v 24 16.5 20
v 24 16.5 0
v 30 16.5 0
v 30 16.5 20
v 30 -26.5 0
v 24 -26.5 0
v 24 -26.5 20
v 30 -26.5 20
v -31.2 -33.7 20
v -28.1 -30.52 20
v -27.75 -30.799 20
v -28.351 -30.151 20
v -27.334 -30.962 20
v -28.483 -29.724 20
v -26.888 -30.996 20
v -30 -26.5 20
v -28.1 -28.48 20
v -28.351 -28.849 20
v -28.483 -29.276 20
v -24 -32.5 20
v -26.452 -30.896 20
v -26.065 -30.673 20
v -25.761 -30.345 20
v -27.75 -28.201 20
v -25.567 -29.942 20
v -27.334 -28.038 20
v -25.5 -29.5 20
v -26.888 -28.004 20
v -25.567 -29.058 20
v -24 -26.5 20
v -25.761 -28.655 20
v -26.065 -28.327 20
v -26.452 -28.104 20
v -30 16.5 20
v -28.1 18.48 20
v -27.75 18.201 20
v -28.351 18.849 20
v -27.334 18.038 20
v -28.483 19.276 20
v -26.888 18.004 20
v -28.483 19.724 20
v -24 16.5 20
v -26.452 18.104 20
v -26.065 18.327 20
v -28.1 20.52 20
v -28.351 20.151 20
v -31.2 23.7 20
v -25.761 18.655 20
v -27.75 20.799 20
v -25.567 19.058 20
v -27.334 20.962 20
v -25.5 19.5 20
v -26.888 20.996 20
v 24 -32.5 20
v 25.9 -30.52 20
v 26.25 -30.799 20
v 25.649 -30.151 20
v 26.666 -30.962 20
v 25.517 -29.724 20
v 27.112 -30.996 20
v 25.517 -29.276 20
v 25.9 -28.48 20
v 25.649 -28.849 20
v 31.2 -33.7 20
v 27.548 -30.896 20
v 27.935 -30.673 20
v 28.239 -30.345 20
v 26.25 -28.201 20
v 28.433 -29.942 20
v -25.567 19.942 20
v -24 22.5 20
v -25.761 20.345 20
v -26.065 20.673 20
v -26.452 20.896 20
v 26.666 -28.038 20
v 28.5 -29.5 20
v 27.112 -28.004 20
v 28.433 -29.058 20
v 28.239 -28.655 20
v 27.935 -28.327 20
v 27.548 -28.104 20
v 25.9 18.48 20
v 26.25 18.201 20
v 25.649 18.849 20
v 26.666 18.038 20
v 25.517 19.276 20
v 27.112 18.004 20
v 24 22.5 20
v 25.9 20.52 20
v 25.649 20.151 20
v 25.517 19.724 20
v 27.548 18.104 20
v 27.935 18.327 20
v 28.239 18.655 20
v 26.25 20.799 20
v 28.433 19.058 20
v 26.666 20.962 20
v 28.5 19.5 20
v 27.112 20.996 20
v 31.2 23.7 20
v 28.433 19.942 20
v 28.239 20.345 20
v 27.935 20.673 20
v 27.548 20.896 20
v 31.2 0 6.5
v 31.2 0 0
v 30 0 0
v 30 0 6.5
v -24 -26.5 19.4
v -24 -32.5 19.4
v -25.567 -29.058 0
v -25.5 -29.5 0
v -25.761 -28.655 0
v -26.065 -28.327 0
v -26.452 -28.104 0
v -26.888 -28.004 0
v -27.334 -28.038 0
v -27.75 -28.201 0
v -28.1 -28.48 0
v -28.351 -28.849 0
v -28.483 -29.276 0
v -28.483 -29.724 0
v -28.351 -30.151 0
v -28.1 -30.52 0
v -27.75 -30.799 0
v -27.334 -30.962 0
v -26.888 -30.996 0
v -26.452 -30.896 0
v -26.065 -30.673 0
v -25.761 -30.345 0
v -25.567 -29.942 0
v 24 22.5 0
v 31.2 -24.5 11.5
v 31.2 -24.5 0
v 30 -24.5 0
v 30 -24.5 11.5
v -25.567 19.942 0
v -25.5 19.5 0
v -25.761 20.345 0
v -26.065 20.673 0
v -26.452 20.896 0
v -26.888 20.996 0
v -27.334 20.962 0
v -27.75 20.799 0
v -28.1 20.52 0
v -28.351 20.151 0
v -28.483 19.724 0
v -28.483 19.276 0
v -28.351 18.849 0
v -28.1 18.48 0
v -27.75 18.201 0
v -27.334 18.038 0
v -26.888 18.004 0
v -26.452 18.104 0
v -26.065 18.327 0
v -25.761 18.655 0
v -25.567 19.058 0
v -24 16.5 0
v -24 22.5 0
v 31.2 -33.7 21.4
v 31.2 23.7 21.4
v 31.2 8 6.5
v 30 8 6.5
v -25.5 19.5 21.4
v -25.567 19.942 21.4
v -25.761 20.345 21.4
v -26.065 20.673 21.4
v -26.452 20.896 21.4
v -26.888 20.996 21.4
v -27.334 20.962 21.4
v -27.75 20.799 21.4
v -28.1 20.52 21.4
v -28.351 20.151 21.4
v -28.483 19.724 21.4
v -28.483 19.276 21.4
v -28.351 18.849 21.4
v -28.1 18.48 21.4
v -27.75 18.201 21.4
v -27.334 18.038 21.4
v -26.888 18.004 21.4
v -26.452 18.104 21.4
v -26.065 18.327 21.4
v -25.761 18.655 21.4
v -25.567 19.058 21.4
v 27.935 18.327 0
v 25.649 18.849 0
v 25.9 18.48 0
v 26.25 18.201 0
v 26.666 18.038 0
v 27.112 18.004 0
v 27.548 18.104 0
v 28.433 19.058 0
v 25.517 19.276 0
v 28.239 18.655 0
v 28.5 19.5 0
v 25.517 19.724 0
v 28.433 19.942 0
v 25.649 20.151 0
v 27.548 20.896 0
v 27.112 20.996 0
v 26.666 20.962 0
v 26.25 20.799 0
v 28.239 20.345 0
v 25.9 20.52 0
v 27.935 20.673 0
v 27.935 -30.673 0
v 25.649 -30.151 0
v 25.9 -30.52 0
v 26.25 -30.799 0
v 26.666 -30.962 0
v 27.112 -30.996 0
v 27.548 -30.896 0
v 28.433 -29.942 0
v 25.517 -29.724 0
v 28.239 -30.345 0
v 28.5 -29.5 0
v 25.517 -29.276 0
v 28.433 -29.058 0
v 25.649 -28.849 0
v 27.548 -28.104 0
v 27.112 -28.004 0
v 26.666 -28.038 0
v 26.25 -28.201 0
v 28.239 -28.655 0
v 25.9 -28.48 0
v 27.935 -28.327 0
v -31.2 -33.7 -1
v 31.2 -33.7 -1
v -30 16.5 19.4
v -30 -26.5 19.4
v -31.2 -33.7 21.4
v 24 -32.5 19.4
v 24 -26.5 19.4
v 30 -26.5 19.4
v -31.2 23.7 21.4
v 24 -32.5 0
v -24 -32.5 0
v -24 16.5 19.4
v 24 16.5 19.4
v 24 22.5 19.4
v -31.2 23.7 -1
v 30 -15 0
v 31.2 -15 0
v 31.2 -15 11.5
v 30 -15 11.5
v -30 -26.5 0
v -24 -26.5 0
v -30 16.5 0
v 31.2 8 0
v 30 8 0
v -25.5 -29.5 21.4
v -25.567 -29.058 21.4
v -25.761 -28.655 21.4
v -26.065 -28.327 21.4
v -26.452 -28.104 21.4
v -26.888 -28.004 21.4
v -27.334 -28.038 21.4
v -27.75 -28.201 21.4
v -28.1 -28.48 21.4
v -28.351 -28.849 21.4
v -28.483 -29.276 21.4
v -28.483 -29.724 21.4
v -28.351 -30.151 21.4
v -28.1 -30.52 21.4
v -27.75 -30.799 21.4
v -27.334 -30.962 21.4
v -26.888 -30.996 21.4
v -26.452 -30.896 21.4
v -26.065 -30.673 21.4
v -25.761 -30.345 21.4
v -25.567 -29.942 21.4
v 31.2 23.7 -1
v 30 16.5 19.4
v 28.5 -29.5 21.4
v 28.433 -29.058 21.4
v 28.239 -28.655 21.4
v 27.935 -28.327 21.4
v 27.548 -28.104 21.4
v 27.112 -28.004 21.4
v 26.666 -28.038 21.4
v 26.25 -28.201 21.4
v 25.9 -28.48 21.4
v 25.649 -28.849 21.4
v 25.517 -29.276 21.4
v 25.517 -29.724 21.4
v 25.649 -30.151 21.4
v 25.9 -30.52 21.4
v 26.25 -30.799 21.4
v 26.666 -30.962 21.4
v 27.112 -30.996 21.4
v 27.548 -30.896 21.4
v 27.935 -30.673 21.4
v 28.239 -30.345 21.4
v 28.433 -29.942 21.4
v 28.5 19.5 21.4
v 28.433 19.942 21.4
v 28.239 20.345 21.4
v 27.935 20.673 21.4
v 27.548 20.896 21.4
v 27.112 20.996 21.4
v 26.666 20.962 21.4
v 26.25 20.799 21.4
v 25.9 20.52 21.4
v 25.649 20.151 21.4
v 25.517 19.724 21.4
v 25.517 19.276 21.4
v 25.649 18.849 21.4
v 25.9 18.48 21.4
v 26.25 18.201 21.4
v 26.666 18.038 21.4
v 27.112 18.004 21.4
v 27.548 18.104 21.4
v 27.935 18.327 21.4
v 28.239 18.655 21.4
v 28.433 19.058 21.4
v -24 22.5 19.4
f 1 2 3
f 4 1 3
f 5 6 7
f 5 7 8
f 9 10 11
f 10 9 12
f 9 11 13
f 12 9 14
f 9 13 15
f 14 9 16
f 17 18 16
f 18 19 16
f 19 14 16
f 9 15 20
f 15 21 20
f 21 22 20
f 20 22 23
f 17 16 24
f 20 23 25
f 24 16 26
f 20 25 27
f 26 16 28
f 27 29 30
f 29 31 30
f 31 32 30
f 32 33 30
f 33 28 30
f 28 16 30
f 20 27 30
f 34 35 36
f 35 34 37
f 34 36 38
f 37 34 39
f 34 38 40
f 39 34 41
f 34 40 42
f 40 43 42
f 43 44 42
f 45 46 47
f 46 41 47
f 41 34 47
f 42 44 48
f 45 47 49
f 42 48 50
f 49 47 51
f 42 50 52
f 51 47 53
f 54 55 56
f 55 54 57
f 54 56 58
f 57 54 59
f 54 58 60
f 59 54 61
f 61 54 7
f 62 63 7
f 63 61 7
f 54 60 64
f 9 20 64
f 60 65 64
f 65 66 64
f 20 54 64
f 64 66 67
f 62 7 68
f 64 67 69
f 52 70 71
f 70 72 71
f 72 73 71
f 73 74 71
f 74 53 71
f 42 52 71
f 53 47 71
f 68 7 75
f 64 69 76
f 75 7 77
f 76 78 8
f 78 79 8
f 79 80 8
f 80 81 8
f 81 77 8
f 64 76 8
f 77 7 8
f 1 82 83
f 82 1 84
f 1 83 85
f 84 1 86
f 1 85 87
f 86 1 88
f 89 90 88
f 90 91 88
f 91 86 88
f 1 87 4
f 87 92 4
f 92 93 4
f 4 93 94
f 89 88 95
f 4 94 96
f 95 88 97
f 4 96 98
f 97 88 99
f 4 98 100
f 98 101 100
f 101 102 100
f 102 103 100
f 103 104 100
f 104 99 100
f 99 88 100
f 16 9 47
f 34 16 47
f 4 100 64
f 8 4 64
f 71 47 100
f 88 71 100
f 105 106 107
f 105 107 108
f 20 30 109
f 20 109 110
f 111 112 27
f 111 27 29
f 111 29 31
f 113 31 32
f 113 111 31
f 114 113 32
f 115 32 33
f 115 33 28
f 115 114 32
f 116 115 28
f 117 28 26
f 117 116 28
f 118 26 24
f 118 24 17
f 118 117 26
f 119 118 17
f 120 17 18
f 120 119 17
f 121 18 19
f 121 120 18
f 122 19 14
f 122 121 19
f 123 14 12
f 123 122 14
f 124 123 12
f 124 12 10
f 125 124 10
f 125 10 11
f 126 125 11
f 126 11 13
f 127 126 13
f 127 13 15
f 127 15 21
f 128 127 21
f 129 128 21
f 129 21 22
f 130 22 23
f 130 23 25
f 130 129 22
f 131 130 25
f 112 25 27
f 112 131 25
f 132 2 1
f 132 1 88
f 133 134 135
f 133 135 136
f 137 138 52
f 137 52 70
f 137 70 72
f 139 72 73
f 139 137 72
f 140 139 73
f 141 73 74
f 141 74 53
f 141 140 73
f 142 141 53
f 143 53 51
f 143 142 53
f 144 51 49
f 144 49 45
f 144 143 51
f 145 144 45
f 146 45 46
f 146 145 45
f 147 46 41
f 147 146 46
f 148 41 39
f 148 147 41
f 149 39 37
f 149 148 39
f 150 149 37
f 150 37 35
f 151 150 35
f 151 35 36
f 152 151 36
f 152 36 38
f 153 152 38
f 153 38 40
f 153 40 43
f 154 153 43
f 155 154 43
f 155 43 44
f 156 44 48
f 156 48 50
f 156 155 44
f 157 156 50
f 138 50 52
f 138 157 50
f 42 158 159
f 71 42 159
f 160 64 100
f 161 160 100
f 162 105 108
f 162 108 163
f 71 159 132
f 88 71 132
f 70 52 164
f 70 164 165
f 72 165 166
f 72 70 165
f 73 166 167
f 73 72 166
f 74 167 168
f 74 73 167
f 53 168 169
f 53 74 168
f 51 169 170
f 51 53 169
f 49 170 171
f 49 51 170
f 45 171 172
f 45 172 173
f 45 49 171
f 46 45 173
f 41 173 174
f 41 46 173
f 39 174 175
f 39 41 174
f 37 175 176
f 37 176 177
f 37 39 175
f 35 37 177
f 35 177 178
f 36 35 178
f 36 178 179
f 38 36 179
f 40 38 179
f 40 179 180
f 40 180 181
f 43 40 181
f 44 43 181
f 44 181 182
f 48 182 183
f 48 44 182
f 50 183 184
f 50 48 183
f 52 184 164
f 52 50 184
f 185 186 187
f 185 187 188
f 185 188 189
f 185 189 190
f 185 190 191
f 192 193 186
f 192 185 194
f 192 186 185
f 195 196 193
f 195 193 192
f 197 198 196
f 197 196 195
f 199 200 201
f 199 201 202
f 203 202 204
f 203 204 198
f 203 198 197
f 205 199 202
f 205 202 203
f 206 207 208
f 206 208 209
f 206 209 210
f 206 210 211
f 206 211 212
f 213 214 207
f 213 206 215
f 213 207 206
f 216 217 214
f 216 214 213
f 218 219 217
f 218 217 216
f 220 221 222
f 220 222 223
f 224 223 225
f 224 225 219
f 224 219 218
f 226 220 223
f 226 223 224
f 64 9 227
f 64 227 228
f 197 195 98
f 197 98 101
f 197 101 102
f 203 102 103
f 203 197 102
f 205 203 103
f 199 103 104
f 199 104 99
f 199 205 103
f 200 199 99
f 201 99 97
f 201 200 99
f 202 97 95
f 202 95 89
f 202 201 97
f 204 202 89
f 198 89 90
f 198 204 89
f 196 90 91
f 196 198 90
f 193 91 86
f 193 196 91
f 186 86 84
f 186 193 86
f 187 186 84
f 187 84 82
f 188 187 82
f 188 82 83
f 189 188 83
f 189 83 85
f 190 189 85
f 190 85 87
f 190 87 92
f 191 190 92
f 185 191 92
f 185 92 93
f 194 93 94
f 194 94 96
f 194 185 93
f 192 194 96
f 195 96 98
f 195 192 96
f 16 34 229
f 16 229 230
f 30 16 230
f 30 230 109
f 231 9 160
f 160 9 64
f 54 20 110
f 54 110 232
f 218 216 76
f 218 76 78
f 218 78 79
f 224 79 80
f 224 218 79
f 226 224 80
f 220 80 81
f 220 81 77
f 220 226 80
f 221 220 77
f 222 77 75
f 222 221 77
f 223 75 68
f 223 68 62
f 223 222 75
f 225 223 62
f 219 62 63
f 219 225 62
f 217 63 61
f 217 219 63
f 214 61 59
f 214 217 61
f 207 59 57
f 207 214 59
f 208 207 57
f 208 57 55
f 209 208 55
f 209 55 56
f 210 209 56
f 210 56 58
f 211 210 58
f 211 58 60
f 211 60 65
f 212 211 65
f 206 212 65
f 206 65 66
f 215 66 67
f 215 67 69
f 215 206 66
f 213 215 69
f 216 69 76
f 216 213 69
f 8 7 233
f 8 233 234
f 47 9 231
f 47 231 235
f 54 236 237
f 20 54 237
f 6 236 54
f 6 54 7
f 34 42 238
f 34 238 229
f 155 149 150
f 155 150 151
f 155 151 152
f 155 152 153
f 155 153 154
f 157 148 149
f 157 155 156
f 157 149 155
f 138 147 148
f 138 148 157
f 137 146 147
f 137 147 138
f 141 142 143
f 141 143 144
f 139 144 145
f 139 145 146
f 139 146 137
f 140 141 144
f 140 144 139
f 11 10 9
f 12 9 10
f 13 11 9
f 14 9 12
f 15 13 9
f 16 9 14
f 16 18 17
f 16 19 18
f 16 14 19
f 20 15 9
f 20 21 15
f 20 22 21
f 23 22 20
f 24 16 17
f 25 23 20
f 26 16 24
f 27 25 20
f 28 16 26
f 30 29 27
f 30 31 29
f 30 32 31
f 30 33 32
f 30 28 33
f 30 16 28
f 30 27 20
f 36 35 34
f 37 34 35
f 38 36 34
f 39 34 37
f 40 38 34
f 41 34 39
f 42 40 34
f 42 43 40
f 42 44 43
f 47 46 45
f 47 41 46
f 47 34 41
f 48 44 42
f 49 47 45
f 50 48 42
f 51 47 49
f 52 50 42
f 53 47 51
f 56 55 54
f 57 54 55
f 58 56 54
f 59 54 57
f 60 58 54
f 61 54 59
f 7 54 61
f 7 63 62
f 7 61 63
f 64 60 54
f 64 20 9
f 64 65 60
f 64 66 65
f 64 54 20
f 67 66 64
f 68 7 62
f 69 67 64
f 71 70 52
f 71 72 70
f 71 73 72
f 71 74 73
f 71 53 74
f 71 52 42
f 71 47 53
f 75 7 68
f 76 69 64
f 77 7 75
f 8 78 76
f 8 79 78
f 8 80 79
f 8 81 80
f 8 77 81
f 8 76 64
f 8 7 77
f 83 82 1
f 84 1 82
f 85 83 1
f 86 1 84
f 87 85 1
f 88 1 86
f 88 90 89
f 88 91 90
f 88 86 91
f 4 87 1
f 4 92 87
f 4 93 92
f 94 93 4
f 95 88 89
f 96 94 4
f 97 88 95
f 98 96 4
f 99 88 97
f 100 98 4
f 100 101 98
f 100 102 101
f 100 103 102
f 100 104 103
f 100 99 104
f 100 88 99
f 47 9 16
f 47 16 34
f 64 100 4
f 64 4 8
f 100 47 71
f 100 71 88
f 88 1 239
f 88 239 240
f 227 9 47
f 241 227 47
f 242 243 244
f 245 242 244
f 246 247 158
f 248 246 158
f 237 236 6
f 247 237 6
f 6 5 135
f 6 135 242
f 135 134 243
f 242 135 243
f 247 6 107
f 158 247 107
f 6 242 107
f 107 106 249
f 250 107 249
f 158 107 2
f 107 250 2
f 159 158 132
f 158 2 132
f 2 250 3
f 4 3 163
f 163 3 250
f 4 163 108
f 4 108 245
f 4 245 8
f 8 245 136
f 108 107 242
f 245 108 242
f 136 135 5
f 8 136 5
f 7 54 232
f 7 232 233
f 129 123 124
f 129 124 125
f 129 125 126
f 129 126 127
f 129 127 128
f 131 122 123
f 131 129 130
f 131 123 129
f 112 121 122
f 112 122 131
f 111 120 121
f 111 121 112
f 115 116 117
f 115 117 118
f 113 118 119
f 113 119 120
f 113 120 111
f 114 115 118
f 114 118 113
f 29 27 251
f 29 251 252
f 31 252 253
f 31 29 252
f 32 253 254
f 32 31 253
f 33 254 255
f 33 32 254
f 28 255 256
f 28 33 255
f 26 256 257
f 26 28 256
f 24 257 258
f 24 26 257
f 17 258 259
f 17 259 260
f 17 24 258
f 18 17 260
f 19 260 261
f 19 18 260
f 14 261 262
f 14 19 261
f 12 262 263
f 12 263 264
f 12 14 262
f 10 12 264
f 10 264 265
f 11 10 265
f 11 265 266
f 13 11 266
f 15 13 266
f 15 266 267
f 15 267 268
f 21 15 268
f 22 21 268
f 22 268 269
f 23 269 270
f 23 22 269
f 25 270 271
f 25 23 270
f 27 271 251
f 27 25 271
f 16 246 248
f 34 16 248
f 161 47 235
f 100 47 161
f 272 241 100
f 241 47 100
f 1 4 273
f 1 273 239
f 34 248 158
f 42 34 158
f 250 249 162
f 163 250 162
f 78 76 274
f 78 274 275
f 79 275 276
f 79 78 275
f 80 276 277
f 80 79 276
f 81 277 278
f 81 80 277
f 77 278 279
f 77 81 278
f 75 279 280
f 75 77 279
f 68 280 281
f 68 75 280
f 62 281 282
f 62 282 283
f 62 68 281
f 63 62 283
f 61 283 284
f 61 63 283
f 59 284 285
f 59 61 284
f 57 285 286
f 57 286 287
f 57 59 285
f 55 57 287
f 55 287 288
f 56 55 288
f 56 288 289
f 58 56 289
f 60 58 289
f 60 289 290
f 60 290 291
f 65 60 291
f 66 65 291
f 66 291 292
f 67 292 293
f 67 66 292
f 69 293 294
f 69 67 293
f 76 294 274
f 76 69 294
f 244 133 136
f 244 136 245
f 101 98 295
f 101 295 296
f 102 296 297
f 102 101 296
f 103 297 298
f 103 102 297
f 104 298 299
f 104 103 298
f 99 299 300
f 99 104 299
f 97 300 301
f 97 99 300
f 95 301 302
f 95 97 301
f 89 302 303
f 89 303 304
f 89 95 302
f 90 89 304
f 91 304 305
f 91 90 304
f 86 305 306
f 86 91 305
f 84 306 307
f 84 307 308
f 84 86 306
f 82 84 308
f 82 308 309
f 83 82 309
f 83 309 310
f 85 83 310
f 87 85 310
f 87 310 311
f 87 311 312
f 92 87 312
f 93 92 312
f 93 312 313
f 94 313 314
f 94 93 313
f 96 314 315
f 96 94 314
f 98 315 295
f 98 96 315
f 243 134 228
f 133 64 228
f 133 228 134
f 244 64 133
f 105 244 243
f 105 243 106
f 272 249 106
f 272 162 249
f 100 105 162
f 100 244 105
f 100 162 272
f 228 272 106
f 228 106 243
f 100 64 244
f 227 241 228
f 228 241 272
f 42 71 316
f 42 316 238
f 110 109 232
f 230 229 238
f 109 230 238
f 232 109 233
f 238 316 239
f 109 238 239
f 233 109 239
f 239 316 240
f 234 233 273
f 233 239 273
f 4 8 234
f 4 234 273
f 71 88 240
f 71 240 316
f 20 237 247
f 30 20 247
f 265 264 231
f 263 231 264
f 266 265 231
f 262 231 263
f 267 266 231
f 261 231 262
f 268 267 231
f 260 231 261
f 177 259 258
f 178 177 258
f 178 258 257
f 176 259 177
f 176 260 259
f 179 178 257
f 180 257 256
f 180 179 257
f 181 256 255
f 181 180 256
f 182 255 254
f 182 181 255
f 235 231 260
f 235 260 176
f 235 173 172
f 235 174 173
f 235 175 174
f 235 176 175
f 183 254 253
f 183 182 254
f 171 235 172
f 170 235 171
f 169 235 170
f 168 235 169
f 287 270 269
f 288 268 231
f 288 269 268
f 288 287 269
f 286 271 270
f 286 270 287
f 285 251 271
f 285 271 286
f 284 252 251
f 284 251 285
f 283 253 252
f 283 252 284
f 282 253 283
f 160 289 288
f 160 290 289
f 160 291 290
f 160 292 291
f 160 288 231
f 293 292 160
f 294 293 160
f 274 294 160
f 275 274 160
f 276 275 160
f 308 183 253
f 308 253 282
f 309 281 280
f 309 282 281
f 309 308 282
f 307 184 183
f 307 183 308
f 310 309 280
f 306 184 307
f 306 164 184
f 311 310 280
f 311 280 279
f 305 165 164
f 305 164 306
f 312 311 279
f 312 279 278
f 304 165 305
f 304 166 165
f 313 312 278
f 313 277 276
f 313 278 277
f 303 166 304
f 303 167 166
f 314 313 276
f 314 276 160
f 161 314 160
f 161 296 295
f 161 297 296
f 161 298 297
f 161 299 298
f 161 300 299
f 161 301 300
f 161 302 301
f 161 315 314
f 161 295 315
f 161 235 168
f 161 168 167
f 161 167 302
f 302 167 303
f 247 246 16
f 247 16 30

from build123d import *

# Parameters (mm, degrees)
F0_W     = 62.4
F0_H     = 57.4
F0_W_2   = 6
F0_H_2   = 6
F0_R     = 1.5
F1_DEPTH = 20
F2_W     = 62.4
F2_H     = 57.4
F3_DEPTH = 1
F4_W     = 9.5
F4_H     = 11.5
F4_W_2   = 8
F4_H_2   = 6.5
F5_DEPTH = 1.2
F7_DEPTH = 0.6
F6_W     = 62.4
F6_H     = 57.4
F6_R     = 1.5
F8_DEPTH = 1.4


with BuildPart() as f1:
    # F0 (on Top) → F1 (new body)
    with BuildSketch(Plane.XY):
        with Locations((0, -5)):
            Rectangle(F0_W, F0_H)
        Polygon((-30, 16.5), (-30, 22.5), (-24, 22.5), (24, 22.5), (30, 22.5), (30, 16.5), (30, -26.5), (30, -32.5), (24, -32.5), (-24, -32.5), (-30, -32.5), (-30, -26.5), align=None, mode=Mode.SUBTRACT)
        with Locations((27, -29.5)):
            Rectangle(F0_W_2, F0_H_2)
        with Locations((27, -29.5)):
            Circle(F0_R, mode=Mode.SUBTRACT)
        with Locations((-27, 19.5)):
            Rectangle(F0_W_2, F0_H_2)
        with Locations((-27, 19.5)):
            Circle(F0_R, mode=Mode.SUBTRACT)
        with Locations((-27, -29.5)):
            Rectangle(F0_W_2, F0_H_2)
        with Locations((-27, -29.5)):
            Circle(F0_R, mode=Mode.SUBTRACT)
        with Locations((27, 19.5)):
            Rectangle(F0_W_2, F0_H_2)
        with Locations((27, 19.5)):
            Circle(F0_R, mode=Mode.SUBTRACT)
    extrude(amount=F1_DEPTH)

    # F2 (on Top) → F3 (join)
    with BuildSketch(Plane.XY):
        with Locations((0, -5)):
            Rectangle(F2_W, F2_H)
    extrude(amount=-F3_DEPTH)

    # F4 (on face) → F5 (cut, through all)
    with BuildSketch(Plane.YZ.offset(31.2)):
        with Locations((-19.75, 5.75)):
            Rectangle(F4_W, F4_H)
        with Locations((4, 3.25)):
            Rectangle(F4_W_2, F4_H_2)
    extrude(amount=-F5_DEPTH, mode=Mode.SUBTRACT)


with BuildPart() as f7:
    # F6 (on face) → F7 (new body)
    with BuildSketch(Plane.XY.offset(20)):
        Polygon((24, 22.5), (-24, 22.5), (-24, 16.5), (-30, 16.5), (-30, -26.5), (-24, -26.5), (-24, -32.5), (24, -32.5), (24, -26.5), (30, -26.5), (30, 16.5), (24, 16.5), align=None)
    extrude(amount=-F7_DEPTH)

    # F6 (on face) → F8 (join)
    with BuildSketch(Plane.XY.offset(20)):
        with Locations((0, -5)):
            Rectangle(F6_W, F6_H)
        with Locations((-27, -29.5)):
            Circle(F6_R, mode=Mode.SUBTRACT)
        with Locations((27, -29.5)):
            Circle(F6_R, mode=Mode.SUBTRACT)
        with Locations((-27, 19.5)):
            Circle(F6_R, mode=Mode.SUBTRACT)
        Polygon((-24, 16.5), (-24, 22.5), (24, 22.5), (24, 16.5), (30, 16.5), (30, -26.5), (24, -26.5), (24, -32.5), (-24, -32.5), (-24, -26.5), (-30, -26.5), (-30, 16.5), align=None, mode=Mode.SUBTRACT)
        with Locations((27, 19.5)):
            Circle(F6_R, mode=Mode.SUBTRACT)
        Polygon((24, 22.5), (-24, 22.5), (-24, 16.5), (-30, 16.5), (-30, -26.5), (-24, -26.5), (-24, -32.5), (24, -32.5), (24, -26.5), (30, -26.5), (30, 16.5), (24, 16.5), align=None)
    extrude(amount=F8_DEPTH)


solid = Compound([f1.part, f7.part])
